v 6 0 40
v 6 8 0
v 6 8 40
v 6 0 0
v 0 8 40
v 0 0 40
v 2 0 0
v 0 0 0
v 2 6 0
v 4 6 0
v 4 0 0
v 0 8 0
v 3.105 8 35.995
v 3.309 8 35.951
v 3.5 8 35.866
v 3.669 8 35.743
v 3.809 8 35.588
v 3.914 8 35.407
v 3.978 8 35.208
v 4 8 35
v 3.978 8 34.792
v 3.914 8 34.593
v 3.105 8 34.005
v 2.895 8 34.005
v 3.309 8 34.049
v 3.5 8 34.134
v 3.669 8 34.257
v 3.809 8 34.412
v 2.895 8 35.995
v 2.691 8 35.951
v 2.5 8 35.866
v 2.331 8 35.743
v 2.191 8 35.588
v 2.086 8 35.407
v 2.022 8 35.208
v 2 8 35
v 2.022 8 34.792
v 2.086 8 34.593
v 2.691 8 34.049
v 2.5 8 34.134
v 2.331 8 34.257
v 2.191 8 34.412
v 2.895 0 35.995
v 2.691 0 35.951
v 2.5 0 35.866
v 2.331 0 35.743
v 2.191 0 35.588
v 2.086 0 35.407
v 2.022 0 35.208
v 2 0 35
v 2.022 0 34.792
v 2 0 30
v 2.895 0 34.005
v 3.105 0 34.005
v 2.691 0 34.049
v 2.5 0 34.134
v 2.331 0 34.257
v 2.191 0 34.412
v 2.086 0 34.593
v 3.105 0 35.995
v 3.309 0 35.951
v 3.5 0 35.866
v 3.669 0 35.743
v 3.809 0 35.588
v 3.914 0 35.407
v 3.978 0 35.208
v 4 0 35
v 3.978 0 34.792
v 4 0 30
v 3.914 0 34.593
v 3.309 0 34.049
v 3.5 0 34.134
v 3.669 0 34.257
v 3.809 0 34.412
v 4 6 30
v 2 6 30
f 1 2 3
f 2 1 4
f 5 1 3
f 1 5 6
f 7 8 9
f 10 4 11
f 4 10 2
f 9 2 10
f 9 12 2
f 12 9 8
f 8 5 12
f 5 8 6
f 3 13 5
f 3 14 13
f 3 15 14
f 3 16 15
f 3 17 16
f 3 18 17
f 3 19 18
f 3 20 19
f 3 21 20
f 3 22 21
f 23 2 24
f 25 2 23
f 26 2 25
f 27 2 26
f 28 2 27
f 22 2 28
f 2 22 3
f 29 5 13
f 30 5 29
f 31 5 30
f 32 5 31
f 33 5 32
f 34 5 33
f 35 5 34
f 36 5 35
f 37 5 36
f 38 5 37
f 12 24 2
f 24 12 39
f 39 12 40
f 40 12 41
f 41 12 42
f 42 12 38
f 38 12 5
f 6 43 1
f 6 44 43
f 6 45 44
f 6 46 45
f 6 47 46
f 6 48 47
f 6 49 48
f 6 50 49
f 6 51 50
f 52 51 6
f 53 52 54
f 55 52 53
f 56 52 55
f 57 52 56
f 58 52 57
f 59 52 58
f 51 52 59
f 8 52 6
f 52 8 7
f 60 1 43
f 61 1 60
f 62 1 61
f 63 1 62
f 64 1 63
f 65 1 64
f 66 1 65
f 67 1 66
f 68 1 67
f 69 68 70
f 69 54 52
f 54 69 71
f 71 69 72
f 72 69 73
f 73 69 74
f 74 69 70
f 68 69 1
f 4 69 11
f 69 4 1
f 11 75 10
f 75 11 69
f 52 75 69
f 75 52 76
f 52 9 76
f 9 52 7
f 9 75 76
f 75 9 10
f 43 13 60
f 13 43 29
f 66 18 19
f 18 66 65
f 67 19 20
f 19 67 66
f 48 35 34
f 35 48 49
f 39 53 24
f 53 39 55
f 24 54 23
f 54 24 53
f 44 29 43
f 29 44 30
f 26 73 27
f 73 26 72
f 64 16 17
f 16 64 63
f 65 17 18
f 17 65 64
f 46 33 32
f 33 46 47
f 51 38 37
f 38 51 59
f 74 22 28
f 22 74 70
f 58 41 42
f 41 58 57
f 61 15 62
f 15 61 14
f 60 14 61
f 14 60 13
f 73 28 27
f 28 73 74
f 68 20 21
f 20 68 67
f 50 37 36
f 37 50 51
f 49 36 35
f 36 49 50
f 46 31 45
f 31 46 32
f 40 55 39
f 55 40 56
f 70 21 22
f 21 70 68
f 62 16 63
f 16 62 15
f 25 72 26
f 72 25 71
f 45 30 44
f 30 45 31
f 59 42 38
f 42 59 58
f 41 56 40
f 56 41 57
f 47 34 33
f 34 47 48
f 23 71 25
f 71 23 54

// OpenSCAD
$fs=.1;

difference() {
    cube(size=[6,8,40]);
    translate([2,0,0])
    cube(size=[2,6,30]);
    translate([3,3,35])
    rotate([90,0,0])
    cylinder(r=1, h=12, center=true);
}
